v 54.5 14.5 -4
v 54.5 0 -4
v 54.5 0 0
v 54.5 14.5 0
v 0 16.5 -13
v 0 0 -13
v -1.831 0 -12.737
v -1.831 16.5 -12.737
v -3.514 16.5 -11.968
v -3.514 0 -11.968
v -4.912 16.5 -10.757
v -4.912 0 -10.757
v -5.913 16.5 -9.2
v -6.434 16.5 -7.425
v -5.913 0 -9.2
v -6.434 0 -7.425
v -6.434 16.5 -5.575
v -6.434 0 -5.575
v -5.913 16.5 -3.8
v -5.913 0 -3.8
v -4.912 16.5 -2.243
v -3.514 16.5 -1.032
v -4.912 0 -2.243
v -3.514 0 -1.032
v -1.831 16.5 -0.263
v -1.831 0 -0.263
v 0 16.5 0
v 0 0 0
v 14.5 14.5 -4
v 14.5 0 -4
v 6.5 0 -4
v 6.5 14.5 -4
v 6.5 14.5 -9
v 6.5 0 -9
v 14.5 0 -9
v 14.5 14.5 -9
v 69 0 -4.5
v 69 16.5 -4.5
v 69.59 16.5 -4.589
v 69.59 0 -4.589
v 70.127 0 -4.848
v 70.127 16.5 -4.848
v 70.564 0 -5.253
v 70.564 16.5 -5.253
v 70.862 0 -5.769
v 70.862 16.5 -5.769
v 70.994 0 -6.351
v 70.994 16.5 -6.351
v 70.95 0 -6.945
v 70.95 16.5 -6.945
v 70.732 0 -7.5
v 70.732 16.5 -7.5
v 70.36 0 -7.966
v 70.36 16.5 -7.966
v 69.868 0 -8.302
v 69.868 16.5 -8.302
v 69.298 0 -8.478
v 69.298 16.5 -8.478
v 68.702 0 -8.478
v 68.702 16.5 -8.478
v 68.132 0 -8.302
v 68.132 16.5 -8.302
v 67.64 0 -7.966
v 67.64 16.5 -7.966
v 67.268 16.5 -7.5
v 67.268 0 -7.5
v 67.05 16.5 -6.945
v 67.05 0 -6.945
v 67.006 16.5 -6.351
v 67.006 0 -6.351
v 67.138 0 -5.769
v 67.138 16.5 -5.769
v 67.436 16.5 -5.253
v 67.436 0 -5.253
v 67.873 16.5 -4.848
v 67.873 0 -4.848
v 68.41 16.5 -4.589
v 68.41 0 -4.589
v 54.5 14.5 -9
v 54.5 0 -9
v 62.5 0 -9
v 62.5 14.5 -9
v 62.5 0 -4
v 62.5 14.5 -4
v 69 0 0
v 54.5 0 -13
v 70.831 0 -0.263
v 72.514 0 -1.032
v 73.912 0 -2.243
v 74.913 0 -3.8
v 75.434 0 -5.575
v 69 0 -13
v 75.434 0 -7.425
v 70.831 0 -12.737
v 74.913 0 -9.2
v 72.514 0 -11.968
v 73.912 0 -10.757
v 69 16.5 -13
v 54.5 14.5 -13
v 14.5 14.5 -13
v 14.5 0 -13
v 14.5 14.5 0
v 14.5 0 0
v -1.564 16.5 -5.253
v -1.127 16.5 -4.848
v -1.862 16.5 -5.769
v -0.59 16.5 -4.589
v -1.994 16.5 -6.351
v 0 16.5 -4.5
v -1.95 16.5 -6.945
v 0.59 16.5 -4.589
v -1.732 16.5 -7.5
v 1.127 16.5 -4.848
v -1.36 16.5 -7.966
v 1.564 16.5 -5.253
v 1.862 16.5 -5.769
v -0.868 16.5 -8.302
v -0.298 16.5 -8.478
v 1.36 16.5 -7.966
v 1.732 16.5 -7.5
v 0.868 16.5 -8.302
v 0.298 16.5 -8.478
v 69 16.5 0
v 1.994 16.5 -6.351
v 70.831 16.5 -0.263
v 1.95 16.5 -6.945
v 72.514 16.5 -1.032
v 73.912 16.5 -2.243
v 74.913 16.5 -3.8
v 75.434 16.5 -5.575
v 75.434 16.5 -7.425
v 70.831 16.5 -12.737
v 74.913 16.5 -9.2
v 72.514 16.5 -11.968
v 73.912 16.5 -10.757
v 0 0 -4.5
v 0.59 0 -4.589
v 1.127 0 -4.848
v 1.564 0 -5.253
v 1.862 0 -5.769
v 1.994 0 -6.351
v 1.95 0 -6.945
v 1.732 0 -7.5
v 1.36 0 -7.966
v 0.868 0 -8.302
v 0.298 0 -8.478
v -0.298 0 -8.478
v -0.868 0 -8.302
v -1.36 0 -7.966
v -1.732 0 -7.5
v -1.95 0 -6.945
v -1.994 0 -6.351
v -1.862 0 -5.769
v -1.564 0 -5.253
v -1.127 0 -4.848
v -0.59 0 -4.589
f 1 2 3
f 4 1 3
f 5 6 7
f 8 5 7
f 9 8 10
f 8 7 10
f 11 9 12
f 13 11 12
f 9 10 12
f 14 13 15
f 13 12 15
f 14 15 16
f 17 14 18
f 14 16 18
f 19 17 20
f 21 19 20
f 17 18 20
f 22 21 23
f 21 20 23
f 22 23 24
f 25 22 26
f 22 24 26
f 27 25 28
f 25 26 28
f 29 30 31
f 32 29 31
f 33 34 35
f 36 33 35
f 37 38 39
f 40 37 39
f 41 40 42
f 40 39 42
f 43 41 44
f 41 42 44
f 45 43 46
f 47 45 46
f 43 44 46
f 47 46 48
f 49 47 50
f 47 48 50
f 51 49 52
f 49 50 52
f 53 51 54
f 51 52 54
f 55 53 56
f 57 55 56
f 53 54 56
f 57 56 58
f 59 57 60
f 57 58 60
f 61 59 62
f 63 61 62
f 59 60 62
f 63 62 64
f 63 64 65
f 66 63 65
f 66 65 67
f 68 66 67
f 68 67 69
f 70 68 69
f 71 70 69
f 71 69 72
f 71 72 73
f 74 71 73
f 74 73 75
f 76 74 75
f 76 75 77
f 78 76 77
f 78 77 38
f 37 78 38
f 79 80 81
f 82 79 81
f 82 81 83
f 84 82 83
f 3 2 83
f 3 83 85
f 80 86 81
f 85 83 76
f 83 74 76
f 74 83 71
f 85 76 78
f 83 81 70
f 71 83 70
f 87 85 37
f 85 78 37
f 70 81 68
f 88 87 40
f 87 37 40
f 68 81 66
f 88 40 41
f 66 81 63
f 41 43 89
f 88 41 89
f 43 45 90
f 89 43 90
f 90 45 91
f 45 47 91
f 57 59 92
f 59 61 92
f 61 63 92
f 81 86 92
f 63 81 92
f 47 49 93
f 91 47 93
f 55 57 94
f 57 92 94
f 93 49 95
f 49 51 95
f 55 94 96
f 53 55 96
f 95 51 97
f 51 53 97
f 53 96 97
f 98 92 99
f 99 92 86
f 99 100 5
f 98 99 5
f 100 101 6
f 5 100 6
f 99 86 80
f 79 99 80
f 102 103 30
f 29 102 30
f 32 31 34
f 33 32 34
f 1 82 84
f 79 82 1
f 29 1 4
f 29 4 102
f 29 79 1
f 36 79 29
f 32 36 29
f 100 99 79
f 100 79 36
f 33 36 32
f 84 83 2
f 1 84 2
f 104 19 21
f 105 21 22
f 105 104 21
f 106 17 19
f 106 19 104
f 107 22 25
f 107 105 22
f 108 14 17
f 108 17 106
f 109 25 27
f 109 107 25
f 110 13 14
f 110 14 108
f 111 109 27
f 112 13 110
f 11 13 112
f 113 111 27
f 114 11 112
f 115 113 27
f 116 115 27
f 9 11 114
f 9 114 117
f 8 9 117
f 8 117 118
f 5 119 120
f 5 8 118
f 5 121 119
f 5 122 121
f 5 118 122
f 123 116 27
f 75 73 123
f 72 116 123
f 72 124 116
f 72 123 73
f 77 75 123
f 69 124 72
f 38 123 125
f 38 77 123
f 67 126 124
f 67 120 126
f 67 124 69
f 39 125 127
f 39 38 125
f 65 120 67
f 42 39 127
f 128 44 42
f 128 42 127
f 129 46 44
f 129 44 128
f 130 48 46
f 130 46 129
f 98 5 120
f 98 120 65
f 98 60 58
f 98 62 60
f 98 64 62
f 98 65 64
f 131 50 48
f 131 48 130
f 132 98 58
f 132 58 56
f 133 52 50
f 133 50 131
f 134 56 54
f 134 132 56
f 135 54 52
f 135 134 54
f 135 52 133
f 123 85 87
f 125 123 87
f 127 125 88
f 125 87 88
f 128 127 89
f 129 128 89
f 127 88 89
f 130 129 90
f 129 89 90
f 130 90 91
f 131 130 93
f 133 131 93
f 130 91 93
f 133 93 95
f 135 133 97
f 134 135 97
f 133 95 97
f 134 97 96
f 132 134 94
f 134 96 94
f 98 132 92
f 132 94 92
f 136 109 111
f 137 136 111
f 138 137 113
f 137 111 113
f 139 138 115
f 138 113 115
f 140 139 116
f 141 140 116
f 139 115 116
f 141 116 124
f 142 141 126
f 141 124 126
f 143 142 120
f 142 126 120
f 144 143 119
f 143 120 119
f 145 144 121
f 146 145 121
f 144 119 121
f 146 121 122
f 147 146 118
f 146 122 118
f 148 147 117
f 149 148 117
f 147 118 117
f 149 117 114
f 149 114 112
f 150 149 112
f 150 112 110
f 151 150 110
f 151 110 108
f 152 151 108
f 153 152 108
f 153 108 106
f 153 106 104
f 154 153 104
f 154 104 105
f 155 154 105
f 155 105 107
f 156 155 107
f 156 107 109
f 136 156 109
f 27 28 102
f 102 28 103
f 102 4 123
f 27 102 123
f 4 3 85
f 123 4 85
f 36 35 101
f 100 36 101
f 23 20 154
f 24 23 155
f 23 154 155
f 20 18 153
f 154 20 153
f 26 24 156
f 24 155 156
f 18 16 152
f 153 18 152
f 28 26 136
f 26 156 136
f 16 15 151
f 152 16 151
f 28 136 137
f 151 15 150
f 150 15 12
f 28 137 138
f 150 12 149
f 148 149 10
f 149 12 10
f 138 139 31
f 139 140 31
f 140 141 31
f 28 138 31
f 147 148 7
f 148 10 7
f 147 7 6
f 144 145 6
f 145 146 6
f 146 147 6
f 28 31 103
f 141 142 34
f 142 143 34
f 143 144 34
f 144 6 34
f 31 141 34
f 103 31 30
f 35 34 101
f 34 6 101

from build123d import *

# Parameters (mm, degrees)
BOSS_EXTRU_1_DEPTH      = 16.5
ESQUISSE2_R             = 2
ENL_V_MAT_EXTRU_1_DEPTH = 22
ENL_V_MAT_EXTRU_2_DEPTH = 14.5


with BuildPart() as part:
    # Esquisse1 → Boss.-Extru.1 (new body)
    with BuildSketch(Plane(origin=(0, 0, 0), x_dir=(1, 0, 0), z_dir=(0, 1, 0))):
        with BuildLine():
            Line((0, 0), (69, 0))
            ThreePointArc((69, 0), (75.5, 6.5), (69, 13))
            Line((69, 13), (0, 13))
            ThreePointArc((0, 13), (-6.5, 6.5), (0, 0))
        make_face()
    extrude(amount=BOSS_EXTRU_1_DEPTH)

    # Esquisse2 → Enlèv. mat.-Extru.1 (cut)
    with BuildSketch(Plane(origin=(0, 16.5, 0), x_dir=(1, 0, 0), z_dir=(0, 1, 0))):
        with Locations(Location((0, 6.5, 0), (0, 0, 270))):
            Circle(ESQUISSE2_R)
        with Locations(Location((69, 6.5, 0), (0, 0, 270))):
            Circle(ESQUISSE2_R)
    extrude(amount=-ENL_V_MAT_EXTRU_1_DEPTH, mode=Mode.SUBTRACT)

    # Esquisse3 → Enlèv. mat.-Extru.2 (cut)
    with BuildSketch(Plane(origin=(0, 0, 0), x_dir=(-1, 0, 0), z_dir=(0, -1, 0))):
        Polygon((-54.5, 13), (-54.5, 9), (-62.5, 9), (-62.5, 4), (-54.5, 4), (-54.5, 0), (-14.5, 0), (-14.5, 4), (-6.5, 4), (-6.5, 9), (-14.5, 9), (-14.5, 13), align=None)
    extrude(amount=-ENL_V_MAT_EXTRU_2_DEPTH, mode=Mode.SUBTRACT)


solid = part.part
